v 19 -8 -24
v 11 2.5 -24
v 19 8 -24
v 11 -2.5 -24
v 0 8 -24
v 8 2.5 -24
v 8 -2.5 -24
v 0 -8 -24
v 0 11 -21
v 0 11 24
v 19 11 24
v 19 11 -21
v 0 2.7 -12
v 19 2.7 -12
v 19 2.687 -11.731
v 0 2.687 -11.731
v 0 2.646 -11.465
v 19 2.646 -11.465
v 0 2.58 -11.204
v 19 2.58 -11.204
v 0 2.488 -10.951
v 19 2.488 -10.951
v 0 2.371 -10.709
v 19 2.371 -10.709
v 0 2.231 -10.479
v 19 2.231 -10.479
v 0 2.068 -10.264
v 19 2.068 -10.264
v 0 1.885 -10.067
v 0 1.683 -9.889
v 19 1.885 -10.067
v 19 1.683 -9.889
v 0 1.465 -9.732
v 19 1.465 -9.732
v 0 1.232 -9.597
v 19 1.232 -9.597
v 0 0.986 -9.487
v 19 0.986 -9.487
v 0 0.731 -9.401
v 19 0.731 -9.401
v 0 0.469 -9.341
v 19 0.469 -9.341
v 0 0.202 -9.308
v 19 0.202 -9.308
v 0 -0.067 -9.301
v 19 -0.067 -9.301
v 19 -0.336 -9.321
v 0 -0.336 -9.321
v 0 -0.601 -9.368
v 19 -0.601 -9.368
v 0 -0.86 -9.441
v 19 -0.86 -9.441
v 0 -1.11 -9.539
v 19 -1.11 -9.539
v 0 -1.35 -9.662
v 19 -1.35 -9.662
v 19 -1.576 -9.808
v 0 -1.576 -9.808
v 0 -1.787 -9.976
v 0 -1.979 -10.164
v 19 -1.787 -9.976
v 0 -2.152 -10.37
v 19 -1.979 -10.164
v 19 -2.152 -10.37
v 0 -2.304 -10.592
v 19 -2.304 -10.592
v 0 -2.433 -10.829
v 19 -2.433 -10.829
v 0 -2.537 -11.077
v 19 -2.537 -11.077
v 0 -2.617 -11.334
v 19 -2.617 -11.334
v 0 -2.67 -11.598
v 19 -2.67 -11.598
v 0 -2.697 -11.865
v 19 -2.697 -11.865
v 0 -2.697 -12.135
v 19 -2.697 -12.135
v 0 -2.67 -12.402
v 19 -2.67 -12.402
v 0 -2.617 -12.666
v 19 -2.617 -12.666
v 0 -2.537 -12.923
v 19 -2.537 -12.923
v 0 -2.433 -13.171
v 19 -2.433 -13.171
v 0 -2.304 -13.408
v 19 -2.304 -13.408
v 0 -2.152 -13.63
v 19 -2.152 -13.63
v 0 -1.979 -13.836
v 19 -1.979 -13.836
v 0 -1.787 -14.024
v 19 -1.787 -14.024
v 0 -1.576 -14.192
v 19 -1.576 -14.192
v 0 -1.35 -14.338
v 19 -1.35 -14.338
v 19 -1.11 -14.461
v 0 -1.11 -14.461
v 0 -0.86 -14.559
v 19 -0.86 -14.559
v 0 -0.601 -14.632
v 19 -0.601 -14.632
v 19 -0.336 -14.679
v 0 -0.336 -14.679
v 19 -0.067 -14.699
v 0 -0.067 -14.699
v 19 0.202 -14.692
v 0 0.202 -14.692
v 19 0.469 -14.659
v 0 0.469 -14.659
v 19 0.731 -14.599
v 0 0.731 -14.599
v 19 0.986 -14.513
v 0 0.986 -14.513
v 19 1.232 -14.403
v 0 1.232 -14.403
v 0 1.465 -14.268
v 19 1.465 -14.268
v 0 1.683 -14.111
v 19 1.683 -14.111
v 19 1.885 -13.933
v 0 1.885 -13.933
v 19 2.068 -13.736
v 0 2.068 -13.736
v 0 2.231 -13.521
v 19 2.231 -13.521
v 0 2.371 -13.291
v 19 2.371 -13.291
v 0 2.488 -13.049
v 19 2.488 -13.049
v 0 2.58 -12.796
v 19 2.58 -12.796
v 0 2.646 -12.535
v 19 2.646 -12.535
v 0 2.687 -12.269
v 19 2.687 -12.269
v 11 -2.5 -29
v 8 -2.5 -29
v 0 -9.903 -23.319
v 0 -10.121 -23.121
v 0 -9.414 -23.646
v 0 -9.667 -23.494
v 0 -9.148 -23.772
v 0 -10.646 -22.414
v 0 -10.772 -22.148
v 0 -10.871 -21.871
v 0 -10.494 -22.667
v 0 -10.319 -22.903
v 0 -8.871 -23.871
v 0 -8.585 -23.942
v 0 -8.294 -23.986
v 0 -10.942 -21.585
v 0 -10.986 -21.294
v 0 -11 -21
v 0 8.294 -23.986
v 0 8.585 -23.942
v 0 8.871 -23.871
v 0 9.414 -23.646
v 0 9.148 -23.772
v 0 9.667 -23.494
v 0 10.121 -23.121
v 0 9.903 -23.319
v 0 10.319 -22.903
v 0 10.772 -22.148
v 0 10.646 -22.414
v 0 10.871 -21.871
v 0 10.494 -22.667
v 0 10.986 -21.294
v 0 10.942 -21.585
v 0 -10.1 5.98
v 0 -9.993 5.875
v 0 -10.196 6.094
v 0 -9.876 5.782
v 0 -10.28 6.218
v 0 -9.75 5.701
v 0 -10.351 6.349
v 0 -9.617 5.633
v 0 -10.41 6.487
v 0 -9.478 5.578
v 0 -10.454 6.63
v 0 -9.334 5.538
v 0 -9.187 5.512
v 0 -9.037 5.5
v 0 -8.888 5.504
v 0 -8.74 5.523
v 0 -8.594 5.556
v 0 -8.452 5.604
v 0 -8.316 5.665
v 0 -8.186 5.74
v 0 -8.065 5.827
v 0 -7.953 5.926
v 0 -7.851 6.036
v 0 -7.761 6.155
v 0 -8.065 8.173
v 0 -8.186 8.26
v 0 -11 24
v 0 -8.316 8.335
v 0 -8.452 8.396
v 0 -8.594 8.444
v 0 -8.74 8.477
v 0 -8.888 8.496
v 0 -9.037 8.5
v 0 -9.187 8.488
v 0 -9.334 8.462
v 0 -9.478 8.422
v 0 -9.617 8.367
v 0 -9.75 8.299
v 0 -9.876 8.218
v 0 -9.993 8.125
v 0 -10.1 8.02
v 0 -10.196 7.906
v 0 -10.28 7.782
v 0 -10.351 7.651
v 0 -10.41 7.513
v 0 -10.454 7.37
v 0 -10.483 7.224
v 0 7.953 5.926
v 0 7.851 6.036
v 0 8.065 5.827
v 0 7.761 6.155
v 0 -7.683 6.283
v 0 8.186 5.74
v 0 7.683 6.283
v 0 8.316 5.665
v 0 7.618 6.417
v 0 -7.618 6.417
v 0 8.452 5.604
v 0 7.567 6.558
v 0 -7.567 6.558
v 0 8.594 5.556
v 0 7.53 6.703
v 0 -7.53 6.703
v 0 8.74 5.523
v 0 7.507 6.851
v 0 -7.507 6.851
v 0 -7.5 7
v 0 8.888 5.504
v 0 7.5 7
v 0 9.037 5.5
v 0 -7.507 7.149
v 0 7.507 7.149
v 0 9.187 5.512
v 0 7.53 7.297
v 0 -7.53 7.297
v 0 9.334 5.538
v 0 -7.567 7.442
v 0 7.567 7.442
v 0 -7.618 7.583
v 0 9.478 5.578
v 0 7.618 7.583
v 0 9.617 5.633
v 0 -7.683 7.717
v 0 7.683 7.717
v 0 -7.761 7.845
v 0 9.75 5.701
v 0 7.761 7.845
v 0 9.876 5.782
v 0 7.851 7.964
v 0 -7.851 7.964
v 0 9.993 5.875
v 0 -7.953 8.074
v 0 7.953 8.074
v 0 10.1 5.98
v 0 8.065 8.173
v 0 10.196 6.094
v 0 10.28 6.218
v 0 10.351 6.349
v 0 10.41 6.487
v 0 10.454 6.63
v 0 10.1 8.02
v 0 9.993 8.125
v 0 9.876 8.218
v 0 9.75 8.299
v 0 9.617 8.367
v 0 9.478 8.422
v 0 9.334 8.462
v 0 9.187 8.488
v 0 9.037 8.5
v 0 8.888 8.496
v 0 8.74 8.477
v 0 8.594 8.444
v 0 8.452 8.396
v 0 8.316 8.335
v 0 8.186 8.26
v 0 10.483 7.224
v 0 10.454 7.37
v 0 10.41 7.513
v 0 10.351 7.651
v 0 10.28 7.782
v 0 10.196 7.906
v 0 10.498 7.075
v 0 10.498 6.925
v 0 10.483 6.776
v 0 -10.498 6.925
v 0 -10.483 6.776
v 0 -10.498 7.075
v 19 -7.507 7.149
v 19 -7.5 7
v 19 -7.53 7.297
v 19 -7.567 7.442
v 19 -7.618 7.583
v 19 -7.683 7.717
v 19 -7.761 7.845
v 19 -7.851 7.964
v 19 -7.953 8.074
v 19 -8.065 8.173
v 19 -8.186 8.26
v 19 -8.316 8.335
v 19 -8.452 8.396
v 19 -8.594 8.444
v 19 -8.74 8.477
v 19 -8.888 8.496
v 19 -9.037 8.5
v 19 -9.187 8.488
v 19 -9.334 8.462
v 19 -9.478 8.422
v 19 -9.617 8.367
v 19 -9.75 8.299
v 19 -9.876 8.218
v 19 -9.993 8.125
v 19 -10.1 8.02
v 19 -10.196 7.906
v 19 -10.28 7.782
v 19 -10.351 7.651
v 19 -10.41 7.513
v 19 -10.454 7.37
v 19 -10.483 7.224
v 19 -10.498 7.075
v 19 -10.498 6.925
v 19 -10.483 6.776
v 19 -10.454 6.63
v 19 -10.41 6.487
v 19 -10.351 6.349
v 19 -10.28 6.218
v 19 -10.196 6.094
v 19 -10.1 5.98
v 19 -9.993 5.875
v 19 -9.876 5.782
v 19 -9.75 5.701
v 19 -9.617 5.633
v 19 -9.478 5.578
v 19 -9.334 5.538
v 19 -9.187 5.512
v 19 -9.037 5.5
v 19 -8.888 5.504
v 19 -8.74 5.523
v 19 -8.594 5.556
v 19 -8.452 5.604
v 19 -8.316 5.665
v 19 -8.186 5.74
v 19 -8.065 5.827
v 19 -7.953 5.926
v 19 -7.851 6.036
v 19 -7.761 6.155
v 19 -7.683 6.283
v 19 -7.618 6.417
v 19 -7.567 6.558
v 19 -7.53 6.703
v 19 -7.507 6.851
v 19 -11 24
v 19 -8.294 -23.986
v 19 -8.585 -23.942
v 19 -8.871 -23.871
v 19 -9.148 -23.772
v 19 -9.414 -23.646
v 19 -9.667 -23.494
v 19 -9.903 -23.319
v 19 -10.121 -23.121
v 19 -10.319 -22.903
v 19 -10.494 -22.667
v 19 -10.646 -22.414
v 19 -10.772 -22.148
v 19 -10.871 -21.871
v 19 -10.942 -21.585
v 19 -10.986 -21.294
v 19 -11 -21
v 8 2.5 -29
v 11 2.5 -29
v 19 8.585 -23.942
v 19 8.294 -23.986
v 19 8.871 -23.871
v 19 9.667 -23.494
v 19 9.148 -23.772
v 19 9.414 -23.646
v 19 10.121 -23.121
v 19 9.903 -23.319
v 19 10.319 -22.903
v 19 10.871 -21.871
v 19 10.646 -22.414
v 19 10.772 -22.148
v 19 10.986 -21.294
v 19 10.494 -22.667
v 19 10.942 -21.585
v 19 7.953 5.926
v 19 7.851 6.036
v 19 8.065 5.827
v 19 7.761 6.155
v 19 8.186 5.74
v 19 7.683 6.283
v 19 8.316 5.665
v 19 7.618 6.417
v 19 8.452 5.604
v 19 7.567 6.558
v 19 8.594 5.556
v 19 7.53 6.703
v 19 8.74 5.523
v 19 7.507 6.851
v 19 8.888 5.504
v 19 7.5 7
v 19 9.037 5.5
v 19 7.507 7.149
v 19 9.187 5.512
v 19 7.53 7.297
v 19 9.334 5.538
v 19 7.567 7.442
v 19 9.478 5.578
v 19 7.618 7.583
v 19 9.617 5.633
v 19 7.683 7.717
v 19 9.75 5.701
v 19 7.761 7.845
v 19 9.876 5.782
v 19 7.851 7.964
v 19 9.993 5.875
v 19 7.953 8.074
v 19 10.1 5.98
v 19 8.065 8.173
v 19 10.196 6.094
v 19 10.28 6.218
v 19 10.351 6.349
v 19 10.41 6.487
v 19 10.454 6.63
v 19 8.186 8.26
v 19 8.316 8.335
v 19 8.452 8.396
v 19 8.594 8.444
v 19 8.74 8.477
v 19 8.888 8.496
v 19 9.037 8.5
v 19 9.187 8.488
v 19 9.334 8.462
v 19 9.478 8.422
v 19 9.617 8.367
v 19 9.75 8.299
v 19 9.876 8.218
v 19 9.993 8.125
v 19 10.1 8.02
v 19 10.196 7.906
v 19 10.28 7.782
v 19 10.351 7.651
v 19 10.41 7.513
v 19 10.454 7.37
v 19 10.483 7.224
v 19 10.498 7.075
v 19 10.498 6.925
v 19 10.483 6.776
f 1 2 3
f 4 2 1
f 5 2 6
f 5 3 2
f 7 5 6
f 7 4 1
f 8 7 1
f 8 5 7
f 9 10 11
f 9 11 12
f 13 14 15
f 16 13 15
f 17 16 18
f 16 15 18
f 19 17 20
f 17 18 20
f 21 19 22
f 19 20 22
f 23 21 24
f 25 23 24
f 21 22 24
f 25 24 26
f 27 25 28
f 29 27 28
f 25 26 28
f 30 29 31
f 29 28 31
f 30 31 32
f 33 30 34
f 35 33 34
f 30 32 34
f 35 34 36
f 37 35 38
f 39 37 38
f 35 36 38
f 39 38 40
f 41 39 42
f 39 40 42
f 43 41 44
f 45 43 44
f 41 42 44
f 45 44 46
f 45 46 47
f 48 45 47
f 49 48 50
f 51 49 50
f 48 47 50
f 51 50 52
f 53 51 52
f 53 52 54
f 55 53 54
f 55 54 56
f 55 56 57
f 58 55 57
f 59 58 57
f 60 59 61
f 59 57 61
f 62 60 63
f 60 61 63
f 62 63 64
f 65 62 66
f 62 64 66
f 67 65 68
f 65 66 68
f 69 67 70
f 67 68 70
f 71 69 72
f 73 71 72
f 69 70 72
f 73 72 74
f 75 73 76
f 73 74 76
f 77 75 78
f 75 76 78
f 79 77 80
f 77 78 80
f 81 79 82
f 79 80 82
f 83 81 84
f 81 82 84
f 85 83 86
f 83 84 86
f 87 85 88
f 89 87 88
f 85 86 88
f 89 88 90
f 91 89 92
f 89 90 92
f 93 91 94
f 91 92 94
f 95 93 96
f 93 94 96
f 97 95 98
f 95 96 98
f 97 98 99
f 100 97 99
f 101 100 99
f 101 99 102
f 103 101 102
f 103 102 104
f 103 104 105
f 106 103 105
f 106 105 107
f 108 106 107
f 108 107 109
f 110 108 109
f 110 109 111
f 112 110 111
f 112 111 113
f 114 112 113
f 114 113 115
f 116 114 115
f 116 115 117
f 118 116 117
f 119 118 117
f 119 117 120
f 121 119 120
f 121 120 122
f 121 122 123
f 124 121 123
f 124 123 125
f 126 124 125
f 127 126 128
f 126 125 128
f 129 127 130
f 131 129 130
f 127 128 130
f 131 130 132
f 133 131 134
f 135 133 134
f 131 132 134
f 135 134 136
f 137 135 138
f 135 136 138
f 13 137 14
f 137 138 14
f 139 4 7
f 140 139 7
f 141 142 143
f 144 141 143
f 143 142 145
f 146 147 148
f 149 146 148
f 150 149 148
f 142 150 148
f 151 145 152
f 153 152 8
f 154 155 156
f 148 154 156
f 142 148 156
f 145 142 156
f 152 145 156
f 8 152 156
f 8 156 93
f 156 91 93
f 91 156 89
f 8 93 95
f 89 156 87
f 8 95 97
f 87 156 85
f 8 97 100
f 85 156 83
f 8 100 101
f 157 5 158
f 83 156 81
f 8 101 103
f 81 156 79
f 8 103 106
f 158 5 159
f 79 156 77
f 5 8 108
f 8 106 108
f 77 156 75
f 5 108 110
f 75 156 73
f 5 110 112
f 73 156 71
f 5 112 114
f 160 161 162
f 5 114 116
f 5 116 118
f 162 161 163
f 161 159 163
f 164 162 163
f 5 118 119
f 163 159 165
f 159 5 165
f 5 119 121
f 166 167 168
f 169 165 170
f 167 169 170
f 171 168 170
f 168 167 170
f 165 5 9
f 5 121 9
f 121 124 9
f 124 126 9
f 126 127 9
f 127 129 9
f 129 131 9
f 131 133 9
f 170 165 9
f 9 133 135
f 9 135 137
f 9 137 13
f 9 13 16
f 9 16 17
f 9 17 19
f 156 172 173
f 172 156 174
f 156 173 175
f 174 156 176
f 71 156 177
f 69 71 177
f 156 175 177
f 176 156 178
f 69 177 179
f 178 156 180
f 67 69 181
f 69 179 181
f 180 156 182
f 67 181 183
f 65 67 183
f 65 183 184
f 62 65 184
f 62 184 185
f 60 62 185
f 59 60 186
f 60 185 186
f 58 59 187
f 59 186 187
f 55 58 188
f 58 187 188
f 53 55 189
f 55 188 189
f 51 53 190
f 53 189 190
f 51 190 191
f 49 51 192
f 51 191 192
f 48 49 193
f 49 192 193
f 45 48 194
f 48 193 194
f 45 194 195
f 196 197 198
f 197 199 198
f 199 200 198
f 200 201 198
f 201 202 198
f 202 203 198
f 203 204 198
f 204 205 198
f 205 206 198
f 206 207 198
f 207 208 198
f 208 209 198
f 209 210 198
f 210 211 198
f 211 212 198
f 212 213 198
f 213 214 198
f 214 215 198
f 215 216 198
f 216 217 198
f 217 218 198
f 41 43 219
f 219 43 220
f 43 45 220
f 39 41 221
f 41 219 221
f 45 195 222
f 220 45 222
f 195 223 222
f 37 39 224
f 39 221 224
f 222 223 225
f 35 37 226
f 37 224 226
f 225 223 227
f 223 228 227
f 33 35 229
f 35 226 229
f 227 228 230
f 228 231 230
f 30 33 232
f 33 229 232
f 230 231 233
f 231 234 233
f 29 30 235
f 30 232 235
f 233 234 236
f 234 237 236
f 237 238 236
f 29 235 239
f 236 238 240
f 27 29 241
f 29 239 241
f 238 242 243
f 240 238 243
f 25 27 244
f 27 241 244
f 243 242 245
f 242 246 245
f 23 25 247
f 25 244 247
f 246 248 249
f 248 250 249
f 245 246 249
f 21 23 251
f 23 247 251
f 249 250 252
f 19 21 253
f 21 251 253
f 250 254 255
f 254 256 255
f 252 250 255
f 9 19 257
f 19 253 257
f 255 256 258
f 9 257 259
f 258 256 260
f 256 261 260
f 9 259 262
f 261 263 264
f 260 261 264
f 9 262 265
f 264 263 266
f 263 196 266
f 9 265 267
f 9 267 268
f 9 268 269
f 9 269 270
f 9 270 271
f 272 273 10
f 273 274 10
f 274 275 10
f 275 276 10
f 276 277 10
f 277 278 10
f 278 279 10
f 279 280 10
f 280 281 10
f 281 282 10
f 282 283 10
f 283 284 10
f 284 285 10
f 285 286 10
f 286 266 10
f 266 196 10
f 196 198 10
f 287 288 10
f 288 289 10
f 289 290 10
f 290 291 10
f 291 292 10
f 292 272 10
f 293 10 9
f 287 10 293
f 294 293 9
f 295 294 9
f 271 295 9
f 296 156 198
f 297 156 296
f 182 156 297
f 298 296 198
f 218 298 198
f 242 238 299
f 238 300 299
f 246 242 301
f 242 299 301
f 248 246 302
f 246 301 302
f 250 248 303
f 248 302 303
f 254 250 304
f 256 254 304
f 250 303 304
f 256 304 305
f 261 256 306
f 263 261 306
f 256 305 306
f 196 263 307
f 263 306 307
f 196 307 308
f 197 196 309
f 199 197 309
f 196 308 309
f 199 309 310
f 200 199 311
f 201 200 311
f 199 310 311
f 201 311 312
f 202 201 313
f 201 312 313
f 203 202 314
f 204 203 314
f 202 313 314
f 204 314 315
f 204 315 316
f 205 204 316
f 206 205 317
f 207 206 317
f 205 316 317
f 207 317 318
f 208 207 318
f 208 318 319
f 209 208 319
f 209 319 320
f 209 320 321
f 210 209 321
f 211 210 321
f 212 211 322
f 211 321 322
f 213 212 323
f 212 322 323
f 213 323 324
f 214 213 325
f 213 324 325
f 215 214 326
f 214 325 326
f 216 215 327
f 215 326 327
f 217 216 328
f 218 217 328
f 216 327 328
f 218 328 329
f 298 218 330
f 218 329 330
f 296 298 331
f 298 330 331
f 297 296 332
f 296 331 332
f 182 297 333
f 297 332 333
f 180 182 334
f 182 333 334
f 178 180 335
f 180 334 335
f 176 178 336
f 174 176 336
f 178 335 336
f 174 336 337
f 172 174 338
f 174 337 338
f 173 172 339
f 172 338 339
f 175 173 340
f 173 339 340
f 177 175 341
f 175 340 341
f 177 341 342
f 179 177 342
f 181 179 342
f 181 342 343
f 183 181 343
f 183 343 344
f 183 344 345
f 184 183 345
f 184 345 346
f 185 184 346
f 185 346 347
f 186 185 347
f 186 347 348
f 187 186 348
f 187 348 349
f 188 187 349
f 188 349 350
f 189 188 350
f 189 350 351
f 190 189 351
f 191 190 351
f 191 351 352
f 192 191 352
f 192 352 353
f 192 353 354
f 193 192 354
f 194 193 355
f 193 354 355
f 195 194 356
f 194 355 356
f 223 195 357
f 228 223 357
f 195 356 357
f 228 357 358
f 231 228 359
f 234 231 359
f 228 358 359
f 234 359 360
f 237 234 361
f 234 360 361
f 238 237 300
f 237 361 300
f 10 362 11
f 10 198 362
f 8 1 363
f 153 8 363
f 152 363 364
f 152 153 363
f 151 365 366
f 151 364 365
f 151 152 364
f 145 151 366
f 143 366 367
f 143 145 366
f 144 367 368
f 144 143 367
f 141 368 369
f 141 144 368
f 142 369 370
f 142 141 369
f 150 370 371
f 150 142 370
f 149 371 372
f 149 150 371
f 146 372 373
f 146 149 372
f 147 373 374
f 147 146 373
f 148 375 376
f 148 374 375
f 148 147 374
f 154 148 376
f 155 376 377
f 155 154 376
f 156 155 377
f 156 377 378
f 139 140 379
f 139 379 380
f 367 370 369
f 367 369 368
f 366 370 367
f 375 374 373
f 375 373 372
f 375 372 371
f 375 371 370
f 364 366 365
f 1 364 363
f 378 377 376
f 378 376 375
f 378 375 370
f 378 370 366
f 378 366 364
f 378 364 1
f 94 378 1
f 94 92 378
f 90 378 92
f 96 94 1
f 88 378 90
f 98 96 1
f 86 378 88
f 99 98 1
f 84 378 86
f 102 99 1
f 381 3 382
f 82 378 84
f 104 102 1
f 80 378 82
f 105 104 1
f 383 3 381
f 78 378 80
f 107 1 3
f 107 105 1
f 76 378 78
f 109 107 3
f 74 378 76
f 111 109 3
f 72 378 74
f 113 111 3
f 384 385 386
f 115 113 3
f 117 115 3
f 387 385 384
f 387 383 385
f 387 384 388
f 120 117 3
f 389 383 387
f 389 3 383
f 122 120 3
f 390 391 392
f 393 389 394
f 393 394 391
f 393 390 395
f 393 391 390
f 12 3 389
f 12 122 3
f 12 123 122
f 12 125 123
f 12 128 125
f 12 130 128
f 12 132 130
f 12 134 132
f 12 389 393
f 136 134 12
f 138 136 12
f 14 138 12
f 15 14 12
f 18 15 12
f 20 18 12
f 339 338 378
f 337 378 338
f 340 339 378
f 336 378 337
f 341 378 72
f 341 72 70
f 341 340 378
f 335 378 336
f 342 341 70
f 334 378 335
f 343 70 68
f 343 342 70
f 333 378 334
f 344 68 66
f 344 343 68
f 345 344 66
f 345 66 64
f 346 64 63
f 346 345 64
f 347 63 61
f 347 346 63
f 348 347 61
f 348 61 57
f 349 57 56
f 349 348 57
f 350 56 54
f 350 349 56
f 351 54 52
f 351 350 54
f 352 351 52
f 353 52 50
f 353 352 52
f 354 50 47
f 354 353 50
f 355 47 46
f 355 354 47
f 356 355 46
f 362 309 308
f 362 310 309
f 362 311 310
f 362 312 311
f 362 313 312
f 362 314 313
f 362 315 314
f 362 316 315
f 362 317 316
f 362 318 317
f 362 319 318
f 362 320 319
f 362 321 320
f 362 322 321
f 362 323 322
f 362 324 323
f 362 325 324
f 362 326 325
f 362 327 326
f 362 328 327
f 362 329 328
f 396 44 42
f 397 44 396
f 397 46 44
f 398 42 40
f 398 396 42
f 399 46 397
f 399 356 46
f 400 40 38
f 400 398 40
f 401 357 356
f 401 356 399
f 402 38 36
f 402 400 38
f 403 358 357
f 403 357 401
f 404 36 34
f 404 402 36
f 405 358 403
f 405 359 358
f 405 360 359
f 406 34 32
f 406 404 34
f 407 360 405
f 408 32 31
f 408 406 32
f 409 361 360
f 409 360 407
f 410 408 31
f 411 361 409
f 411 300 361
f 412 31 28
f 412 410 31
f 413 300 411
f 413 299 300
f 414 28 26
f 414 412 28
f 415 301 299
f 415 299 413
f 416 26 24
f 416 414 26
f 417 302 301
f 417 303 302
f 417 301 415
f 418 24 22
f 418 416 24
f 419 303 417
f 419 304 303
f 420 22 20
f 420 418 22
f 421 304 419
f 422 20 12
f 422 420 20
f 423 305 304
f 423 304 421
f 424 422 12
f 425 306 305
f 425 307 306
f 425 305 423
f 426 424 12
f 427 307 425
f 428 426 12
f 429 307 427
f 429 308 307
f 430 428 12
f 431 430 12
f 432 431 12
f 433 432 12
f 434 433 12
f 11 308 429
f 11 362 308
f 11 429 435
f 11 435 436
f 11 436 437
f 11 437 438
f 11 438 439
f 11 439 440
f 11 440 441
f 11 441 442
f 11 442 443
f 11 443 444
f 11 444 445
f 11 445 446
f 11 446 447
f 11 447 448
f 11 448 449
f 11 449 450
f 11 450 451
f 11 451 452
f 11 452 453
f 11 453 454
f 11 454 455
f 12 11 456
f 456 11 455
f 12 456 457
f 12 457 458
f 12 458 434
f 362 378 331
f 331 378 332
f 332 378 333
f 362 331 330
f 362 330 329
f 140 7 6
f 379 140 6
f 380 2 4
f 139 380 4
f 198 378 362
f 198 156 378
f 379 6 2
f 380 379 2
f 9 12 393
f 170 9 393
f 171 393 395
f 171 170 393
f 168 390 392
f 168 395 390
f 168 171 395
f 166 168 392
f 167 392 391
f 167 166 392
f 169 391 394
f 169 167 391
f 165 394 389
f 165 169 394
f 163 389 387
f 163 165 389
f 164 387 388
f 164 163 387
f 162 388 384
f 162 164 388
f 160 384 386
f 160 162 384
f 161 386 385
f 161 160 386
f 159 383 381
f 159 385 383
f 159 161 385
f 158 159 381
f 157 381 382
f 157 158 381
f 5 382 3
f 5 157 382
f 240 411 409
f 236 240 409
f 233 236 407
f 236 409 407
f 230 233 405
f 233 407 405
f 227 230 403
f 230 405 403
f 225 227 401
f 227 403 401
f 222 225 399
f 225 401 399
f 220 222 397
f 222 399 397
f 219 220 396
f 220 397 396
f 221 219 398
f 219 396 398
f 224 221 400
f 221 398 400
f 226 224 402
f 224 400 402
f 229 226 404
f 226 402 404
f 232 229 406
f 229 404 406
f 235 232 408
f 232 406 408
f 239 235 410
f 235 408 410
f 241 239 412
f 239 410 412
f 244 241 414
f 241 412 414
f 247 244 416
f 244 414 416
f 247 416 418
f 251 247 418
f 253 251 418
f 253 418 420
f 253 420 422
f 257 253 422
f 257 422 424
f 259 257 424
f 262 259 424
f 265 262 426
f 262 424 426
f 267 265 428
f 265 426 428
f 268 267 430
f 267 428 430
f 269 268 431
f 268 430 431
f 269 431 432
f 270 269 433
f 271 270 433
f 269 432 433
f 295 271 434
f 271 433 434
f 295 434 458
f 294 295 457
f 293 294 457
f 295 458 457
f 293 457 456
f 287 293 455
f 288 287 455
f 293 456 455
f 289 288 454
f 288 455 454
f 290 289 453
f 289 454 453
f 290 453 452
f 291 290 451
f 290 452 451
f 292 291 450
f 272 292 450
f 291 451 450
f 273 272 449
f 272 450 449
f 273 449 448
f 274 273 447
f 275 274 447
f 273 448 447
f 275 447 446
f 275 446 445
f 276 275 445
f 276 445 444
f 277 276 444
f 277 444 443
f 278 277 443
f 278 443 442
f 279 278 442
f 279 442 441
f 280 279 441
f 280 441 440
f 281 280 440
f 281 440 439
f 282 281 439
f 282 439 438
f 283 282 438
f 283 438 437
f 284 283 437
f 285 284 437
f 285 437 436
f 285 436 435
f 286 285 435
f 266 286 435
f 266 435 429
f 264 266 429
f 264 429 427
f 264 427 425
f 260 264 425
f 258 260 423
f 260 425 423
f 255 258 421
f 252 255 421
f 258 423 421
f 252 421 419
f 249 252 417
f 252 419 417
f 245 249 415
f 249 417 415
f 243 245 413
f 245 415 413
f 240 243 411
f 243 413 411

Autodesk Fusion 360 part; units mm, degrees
sketch "Case base" plane through (0, 0, 0) normal (1, 0, 0) x (0, 1, 0)
  line L0 (-11, 24) -> (11, 24)
  line L1 (11, 24) -> (11, -21)
  line L2 (8, -24) -> (-8, -24)
  line L3 (-11, -21) -> (-11, 24)
  line L4 (-11, 24) -> (11, -24) construction
  line L5 (11, 24) -> (-11, -24) construction
  arc A0 (-11, -21) -> (-8, -24) centre (-8, -21) ccw
  arc A1 (8, -24) -> (11, -21) centre (8, -21) ccw
  dimension "d5" = 22
  dimension "d6" = 48
  dimension "d7" = 3
  dimension "d8" = 3
extrude "Case width" add sketch "Case base" along normal blind 19
sketch "Pin base" plane through (0, 0, -24) normal (0, 0, -1) x (1, 0, 0)
  line L0 (0, 8) -> (0, -8)
  line L1 (0, -8) -> (19, -8)
  line L2 (19, -8) -> (19, 8)
  line L3 (19, 8) -> (0, 8)
  line L4 (0, 0) -> (19, 0) construction
  line L5 (11, 2.5) -> (8, 2.5)
  line L6 (8, 2.5) -> (8, -2.5)
  line L7 (8, -2.5) -> (11, -2.5)
  line L8 (11, -2.5) -> (11, 2.5)
  line L9 (11, 2.5) -> (8, -2.5) construction
  line L10 (8, 2.5) -> (11, -2.5) construction
  point P0 (9.5, 0)
  dimension "d11" = 5
  dimension "d12" = 3
extrude "Pin base (1)" add sketch "Pin base" along normal blind 5 contours L5 L6 L7 L8
sketch "Pin hole" plane through (11, 0, 0) normal (1, 0, 0) x (0, 1, 0)
  line L0 (2.5, -24) -> (-2.5, -24)
  line L1 (-2.5, -24) -> (-2.5, -29)
  line L2 (-2.5, -29) -> (2.5, -29)
  line L3 (2.5, -29) -> (2.5, -24)
  circle A0 centre (0, -26.5) radius 1.5
  dimension "d15" = 3
extrude "Pin hole (1)" cut sketch "Pin hole" along normal through all contours A0
sketch "Case axis" plane through (19, 0, 0) normal (1, 0, 0) x (0, 1, 0)
  arc A0 (-11, -21) -> (-8, -24) centre (-8, -21) ccw
  line L0 (-8, -24) -> (8, -24)
  arc A1 (8, -24) -> (11, -21) centre (8, -21) ccw
  line L1 (11, -21) -> (11, 24)
  line L2 (11, 24) -> (-11, 24)
  line L3 (-11, 24) -> (-11, -21)
  line L4 (0, -24) -> (0, -12) construction
  circle A2 centre (0, -12) radius 2.7
  dimension "d17" = 12
  dimension "d18" = 5.4
extrude "Case axis (1)" cut sketch "Case axis" against normal through all contours A2
sketch "Case hole" plane through (19, 0, 0) normal (1, 0, 0) x (0, 1, 0)
  circle A0 centre (0, -12) radius 2.7
  arc A1 (-11, -21) -> (-8, -24) centre (-8, -21) ccw
  line L0 (-8, -24) -> (8, -24)
  arc A2 (8, -24) -> (11, -21) centre (8, -21) ccw
  line L1 (11, -21) -> (11, 24)
  line L2 (11, 24) -> (-11, 24)
  line L3 (-11, 24) -> (-11, -21)
  line L4 (-11, 22) -> (-9, 22) construction
  line L5 (-9, 24) -> (-9, 7) construction
  circle A3 centre (-9, 7) radius 1.5
  dimension "d20" = 2
  dimension "d21" = 17
  dimension "d22" = 3
extrude "Case hole (1)" cut sketch "Case hole" against normal through all contours A3
mirror "Case holes" about plane through (0, 0, 0) normal (0, 1, 0) of "Case hole (1)"
